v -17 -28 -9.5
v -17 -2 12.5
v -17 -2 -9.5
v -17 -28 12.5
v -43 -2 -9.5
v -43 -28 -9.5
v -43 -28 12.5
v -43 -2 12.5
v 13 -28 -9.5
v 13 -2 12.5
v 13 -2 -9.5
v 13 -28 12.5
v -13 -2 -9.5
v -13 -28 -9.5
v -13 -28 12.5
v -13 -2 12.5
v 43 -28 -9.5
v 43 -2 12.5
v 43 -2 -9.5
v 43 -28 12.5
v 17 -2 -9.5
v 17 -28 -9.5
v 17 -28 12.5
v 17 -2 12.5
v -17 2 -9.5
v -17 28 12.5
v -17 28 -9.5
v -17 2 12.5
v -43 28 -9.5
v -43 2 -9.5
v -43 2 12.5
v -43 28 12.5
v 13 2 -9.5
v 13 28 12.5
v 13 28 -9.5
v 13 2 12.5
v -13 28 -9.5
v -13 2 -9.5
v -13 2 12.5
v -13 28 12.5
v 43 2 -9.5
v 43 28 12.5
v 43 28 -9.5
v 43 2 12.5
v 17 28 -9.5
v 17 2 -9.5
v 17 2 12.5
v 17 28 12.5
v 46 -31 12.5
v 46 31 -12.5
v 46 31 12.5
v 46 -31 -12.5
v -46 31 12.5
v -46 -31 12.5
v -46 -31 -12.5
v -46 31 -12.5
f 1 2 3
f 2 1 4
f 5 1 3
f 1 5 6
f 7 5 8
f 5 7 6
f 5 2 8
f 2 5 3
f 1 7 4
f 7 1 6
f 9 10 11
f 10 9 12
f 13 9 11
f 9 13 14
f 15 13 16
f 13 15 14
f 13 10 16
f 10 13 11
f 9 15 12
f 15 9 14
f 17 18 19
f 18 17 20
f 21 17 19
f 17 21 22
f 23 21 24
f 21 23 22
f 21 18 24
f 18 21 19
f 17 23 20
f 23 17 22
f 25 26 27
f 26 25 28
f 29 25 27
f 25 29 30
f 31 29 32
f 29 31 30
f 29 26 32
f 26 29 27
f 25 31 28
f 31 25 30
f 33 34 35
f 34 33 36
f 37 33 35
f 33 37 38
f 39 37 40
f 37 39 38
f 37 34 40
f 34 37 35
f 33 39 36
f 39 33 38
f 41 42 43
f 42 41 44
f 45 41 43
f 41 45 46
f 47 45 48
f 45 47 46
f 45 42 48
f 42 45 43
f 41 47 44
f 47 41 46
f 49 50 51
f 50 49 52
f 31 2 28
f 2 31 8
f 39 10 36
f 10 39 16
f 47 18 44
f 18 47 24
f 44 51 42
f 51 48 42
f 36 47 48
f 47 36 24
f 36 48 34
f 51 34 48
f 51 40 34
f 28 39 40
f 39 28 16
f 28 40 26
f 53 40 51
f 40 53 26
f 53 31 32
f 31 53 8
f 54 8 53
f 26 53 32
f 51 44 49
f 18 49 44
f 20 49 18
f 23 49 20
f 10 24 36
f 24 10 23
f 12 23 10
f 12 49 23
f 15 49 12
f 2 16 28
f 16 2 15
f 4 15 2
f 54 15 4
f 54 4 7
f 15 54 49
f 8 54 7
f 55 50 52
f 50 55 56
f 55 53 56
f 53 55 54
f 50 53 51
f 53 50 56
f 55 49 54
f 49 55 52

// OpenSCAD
$fn = 32;

// ----------------------------------------------------------------------
// Pocket plate 92 x 62 x 25
// 2 x 3 pockets 26 mm square, 22 mm deep
// ----------------------------------------------------------------------

// --- parameters (mm) ---
thickness = 25;  // plate thickness
floor_t = 3;     // material left under each pocket
pocket = 26;     // pocket side length
pitch_x = 30;    // pocket pitch along X
pitch_y = 30;    // pocket pitch along Y
cols = 3;        // pockets per row
rows = 2;        // rows of pockets

// --- derived feature positions (mm) ---
depth = thickness - floor_t;        // = 22   pocket depth, down to the floor
span_x = (cols - 1) * pitch_x;      // = 60   distance between outer pockets
span_y = (rows - 1) * pitch_y;      // = 30   distance between outer pocket rows
origin_x = -span_x / 2;             // = -30   X of the first pocket
origin_y = -span_y / 2;             // = -15   Y of the first pocket
plate = [span_x + pocket + 6, span_y + pocket + 6, thickness];  // = [92, 62, 25]   overall size: pockets plus 3 mm of wall on each side
feature_centers = [
  [origin_x + 0 * pitch_x, origin_y + 0 * pitch_y],
  [origin_x + 1 * pitch_x, origin_y + 0 * pitch_y],
  [origin_x + 2 * pitch_x, origin_y + 0 * pitch_y],
  [origin_x + 0 * pitch_x, origin_y + 1 * pitch_y],
  [origin_x + 1 * pitch_x, origin_y + 1 * pitch_y],
  [origin_x + 2 * pitch_x, origin_y + 1 * pitch_y]
];   // pocket centres, used verbatim by the cutter loop

// plate outline, then one pocket per centre in feature_centers
difference() {
  cube(plate, center = true);
  for (centre = feature_centers)
    translate([centre[0] - pocket / 2, centre[1] - pocket / 2, plate[2] / 2 - depth])
      cube([pocket, pocket, depth + 1]);  // centred on the declared pocket centre
}
